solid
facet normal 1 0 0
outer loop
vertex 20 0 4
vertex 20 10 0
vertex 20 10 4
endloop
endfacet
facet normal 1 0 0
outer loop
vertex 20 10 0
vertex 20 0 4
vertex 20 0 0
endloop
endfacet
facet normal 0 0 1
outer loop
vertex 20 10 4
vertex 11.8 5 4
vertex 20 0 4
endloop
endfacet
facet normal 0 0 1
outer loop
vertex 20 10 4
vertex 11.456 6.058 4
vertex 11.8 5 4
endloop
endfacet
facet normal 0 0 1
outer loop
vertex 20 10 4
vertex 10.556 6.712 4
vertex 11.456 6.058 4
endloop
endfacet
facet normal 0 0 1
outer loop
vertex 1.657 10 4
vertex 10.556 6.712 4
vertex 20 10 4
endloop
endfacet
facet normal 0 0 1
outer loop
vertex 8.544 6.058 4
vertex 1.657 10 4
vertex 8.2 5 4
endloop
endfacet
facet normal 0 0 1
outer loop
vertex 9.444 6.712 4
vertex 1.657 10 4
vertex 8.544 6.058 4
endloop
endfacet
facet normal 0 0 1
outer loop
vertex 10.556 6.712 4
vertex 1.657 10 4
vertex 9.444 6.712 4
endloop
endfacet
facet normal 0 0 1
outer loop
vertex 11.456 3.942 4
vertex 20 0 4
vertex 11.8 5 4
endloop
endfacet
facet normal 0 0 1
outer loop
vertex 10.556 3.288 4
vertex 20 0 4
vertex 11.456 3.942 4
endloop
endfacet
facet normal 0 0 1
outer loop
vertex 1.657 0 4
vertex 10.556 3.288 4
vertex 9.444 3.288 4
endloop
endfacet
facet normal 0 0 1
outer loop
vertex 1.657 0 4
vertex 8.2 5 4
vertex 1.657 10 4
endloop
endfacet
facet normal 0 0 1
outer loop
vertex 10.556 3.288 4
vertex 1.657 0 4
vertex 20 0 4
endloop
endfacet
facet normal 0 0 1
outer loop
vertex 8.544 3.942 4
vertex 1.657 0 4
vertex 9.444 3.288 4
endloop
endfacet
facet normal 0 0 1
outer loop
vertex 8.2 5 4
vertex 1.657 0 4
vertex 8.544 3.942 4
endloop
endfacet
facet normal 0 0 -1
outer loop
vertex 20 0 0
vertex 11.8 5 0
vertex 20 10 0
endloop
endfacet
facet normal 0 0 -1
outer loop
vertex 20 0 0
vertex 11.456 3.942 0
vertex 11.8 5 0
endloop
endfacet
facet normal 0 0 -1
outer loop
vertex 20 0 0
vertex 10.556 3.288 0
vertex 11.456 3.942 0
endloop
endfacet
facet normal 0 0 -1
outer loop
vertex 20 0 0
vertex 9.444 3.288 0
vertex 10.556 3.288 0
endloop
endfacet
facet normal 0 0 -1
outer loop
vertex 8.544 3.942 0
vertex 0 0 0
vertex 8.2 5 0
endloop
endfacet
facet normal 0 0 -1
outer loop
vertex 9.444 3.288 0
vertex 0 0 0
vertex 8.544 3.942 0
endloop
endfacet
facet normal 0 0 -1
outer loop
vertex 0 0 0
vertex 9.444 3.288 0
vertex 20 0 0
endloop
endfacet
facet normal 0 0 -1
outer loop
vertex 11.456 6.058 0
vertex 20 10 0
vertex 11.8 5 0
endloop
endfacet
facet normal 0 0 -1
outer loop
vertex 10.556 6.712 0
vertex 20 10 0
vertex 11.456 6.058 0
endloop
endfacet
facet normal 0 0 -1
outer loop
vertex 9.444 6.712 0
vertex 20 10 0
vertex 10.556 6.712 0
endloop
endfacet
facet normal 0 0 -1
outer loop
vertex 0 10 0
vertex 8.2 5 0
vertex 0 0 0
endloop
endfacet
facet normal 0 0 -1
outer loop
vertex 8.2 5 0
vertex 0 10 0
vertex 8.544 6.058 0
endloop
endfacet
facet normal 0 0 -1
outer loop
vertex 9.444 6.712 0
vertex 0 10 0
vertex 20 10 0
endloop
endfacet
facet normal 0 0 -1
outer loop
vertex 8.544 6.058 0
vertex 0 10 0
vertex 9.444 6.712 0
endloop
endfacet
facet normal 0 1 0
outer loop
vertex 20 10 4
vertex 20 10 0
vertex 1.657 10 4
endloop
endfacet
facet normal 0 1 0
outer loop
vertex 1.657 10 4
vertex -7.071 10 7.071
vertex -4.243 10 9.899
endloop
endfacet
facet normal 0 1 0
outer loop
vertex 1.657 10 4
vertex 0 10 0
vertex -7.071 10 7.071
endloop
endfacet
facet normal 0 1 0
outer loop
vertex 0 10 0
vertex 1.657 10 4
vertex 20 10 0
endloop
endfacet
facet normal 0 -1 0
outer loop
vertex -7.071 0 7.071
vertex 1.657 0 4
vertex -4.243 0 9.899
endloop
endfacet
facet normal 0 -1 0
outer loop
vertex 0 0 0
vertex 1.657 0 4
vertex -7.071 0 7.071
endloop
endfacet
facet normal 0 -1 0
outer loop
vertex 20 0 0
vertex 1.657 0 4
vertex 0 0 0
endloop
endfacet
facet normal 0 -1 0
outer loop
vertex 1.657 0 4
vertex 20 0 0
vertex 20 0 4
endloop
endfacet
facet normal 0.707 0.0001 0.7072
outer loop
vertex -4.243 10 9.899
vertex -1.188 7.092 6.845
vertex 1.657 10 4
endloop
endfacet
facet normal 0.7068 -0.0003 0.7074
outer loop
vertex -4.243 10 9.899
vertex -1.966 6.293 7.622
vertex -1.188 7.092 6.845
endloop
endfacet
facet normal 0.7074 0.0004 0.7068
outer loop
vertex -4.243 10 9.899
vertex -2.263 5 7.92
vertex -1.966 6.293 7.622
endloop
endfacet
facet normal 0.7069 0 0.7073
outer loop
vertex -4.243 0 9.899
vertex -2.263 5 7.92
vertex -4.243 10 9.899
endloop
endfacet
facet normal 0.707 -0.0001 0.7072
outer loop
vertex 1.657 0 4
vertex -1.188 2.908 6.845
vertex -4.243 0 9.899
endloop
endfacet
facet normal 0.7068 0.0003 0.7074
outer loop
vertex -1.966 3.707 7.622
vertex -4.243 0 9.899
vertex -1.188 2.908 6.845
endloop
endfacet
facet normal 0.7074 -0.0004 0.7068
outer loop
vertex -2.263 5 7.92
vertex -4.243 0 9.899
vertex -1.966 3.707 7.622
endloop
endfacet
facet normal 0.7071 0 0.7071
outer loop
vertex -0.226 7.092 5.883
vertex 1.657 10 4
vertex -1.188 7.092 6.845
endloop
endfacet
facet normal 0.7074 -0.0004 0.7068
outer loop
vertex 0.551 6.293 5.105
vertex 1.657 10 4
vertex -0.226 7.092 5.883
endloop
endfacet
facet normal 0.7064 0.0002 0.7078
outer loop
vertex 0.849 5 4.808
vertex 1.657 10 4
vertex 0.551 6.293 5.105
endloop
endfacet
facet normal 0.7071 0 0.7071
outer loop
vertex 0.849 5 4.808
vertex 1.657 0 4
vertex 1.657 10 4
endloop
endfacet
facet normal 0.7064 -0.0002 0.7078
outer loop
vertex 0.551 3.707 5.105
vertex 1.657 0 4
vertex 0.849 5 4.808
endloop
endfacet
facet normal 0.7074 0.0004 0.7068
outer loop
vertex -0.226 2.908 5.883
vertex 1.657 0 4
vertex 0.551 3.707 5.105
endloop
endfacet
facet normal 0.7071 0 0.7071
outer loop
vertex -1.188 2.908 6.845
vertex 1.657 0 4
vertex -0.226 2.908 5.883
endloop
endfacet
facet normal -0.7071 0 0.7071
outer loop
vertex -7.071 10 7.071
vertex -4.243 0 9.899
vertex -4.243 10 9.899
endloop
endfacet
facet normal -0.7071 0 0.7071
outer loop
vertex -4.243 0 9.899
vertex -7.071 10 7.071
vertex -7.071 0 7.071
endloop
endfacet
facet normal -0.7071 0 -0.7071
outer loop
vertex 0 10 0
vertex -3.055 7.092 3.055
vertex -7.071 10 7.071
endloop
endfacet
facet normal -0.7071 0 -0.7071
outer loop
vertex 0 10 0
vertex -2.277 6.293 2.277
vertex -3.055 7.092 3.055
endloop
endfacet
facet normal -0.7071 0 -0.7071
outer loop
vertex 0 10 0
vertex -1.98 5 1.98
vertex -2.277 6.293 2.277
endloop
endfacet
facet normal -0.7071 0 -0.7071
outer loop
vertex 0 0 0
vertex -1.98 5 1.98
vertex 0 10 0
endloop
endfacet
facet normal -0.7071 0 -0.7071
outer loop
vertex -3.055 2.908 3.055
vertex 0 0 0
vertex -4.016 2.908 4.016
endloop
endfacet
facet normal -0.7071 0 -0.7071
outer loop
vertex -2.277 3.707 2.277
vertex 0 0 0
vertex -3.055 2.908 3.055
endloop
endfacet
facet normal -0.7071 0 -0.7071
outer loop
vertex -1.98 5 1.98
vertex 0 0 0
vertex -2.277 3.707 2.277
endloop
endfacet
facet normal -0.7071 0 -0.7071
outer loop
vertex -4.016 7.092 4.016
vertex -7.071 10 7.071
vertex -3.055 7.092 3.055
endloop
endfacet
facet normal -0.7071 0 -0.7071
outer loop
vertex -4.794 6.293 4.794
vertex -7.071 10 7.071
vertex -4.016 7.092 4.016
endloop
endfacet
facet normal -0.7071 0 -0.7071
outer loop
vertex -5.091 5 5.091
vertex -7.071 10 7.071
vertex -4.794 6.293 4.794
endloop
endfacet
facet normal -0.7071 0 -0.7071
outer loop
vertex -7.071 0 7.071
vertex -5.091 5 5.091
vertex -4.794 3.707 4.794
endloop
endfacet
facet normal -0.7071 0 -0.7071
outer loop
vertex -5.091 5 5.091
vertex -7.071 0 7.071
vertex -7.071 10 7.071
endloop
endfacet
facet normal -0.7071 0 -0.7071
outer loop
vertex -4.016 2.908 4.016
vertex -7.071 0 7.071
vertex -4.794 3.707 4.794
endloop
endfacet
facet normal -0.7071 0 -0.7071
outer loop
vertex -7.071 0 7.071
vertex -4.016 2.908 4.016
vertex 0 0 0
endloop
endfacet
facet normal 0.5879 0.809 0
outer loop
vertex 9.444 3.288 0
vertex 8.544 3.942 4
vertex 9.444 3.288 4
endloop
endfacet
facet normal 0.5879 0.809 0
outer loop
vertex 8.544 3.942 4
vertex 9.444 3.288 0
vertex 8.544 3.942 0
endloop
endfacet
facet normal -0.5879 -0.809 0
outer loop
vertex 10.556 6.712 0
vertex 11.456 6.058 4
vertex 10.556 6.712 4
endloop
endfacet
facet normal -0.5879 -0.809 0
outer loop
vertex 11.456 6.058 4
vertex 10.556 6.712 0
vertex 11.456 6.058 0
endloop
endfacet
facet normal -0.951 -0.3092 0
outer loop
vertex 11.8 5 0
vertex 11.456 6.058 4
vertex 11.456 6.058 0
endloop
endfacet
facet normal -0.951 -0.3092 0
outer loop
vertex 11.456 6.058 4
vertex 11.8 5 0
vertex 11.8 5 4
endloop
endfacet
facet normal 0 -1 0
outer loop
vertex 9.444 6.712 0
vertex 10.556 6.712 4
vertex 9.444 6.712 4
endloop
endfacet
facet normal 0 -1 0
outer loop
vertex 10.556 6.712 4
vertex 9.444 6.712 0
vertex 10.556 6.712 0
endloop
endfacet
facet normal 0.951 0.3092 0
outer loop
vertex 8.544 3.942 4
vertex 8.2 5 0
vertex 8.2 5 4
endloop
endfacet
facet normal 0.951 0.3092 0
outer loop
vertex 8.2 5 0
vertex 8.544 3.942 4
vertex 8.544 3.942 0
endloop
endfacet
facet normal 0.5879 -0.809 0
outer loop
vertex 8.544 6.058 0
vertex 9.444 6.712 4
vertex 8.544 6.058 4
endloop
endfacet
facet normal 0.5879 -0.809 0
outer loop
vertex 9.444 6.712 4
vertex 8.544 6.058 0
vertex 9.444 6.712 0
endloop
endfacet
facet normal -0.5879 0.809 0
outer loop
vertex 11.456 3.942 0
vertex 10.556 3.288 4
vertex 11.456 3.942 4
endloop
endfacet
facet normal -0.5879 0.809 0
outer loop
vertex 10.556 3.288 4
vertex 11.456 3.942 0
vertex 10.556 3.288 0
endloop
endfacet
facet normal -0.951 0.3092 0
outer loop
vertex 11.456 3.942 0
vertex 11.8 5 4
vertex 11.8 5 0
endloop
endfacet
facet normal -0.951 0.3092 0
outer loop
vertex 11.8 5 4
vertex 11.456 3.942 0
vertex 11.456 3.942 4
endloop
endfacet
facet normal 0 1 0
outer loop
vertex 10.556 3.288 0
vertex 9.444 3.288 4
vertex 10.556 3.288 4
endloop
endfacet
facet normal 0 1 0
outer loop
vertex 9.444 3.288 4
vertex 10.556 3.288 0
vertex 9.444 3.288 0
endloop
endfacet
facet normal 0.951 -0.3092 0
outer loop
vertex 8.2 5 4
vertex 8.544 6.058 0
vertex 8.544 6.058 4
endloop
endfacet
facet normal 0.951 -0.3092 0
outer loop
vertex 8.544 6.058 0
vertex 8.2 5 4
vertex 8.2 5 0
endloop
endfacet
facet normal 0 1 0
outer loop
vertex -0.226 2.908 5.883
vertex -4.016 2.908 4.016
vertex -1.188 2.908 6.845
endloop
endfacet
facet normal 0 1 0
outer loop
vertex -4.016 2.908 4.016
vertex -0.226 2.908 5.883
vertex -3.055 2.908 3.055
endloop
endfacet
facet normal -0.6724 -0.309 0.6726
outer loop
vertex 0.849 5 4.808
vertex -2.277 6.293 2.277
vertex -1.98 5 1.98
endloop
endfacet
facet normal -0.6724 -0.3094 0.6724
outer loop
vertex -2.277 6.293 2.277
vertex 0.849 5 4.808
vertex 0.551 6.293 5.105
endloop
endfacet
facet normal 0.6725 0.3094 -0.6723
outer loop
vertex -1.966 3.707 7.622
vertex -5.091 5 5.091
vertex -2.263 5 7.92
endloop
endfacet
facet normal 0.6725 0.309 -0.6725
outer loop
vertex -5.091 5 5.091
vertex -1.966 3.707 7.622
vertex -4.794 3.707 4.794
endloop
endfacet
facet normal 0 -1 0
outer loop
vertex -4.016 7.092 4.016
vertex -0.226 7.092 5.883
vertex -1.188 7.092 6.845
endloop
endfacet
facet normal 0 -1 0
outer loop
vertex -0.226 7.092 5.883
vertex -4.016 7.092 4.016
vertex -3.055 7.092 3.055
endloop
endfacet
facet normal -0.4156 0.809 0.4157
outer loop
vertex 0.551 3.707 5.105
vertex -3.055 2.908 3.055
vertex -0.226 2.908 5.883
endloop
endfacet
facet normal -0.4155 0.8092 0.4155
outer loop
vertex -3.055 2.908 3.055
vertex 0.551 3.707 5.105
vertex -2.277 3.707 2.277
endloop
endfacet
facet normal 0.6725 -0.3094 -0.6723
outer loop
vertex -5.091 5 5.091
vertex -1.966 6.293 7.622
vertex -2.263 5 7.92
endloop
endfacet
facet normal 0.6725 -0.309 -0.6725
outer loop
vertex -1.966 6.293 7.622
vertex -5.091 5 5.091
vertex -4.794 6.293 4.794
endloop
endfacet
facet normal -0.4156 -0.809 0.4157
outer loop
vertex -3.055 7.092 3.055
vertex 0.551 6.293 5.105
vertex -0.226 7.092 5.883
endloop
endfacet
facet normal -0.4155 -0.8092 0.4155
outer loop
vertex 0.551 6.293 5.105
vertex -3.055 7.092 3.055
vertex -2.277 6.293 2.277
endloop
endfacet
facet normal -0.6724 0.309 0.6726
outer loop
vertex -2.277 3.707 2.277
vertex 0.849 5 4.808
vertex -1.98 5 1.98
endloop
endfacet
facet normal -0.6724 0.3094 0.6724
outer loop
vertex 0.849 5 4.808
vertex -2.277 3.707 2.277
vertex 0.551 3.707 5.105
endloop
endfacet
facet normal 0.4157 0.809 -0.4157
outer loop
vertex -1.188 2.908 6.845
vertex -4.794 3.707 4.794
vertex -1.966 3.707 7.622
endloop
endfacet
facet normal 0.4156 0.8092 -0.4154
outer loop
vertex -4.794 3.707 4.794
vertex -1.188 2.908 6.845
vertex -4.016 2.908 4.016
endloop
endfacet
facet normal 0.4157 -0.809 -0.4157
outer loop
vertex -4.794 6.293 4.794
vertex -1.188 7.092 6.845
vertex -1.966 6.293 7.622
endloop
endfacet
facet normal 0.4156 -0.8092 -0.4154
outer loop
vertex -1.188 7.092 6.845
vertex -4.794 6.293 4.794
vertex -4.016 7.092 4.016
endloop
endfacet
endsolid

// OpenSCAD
// PRUSA iteration3
// Fan mount
// GNU GPL v3
// Josef Průša <iam@josefprusa.cz> and contributors
// http://www.reprap.org/wiki/Prusa_Mendel
// http://prusamendel.org

module fan_mount_base(){
 translate([0,0,0]) rotate([0,0,0]) cube([20,10, 4]);
 translate([0,0,0]) rotate([0,45,0]) translate([-10,0,0]) cube([10,10, 4]);
}

module fan_mount_holes(){
 translate([10,5,-1]) rotate([0,0,0]) cylinder(h=30, r=1.8, $fn=10);
 translate([0,5,0]) rotate([0,45,0]) translate([-5,0,-1]) cylinder(h=30, r=2.2, $fn=10);
}

// Final part
module fan_mount(){
 difference(){
  fan_mount_base();
  fan_mount_holes();
 }
}

fan_mount();
